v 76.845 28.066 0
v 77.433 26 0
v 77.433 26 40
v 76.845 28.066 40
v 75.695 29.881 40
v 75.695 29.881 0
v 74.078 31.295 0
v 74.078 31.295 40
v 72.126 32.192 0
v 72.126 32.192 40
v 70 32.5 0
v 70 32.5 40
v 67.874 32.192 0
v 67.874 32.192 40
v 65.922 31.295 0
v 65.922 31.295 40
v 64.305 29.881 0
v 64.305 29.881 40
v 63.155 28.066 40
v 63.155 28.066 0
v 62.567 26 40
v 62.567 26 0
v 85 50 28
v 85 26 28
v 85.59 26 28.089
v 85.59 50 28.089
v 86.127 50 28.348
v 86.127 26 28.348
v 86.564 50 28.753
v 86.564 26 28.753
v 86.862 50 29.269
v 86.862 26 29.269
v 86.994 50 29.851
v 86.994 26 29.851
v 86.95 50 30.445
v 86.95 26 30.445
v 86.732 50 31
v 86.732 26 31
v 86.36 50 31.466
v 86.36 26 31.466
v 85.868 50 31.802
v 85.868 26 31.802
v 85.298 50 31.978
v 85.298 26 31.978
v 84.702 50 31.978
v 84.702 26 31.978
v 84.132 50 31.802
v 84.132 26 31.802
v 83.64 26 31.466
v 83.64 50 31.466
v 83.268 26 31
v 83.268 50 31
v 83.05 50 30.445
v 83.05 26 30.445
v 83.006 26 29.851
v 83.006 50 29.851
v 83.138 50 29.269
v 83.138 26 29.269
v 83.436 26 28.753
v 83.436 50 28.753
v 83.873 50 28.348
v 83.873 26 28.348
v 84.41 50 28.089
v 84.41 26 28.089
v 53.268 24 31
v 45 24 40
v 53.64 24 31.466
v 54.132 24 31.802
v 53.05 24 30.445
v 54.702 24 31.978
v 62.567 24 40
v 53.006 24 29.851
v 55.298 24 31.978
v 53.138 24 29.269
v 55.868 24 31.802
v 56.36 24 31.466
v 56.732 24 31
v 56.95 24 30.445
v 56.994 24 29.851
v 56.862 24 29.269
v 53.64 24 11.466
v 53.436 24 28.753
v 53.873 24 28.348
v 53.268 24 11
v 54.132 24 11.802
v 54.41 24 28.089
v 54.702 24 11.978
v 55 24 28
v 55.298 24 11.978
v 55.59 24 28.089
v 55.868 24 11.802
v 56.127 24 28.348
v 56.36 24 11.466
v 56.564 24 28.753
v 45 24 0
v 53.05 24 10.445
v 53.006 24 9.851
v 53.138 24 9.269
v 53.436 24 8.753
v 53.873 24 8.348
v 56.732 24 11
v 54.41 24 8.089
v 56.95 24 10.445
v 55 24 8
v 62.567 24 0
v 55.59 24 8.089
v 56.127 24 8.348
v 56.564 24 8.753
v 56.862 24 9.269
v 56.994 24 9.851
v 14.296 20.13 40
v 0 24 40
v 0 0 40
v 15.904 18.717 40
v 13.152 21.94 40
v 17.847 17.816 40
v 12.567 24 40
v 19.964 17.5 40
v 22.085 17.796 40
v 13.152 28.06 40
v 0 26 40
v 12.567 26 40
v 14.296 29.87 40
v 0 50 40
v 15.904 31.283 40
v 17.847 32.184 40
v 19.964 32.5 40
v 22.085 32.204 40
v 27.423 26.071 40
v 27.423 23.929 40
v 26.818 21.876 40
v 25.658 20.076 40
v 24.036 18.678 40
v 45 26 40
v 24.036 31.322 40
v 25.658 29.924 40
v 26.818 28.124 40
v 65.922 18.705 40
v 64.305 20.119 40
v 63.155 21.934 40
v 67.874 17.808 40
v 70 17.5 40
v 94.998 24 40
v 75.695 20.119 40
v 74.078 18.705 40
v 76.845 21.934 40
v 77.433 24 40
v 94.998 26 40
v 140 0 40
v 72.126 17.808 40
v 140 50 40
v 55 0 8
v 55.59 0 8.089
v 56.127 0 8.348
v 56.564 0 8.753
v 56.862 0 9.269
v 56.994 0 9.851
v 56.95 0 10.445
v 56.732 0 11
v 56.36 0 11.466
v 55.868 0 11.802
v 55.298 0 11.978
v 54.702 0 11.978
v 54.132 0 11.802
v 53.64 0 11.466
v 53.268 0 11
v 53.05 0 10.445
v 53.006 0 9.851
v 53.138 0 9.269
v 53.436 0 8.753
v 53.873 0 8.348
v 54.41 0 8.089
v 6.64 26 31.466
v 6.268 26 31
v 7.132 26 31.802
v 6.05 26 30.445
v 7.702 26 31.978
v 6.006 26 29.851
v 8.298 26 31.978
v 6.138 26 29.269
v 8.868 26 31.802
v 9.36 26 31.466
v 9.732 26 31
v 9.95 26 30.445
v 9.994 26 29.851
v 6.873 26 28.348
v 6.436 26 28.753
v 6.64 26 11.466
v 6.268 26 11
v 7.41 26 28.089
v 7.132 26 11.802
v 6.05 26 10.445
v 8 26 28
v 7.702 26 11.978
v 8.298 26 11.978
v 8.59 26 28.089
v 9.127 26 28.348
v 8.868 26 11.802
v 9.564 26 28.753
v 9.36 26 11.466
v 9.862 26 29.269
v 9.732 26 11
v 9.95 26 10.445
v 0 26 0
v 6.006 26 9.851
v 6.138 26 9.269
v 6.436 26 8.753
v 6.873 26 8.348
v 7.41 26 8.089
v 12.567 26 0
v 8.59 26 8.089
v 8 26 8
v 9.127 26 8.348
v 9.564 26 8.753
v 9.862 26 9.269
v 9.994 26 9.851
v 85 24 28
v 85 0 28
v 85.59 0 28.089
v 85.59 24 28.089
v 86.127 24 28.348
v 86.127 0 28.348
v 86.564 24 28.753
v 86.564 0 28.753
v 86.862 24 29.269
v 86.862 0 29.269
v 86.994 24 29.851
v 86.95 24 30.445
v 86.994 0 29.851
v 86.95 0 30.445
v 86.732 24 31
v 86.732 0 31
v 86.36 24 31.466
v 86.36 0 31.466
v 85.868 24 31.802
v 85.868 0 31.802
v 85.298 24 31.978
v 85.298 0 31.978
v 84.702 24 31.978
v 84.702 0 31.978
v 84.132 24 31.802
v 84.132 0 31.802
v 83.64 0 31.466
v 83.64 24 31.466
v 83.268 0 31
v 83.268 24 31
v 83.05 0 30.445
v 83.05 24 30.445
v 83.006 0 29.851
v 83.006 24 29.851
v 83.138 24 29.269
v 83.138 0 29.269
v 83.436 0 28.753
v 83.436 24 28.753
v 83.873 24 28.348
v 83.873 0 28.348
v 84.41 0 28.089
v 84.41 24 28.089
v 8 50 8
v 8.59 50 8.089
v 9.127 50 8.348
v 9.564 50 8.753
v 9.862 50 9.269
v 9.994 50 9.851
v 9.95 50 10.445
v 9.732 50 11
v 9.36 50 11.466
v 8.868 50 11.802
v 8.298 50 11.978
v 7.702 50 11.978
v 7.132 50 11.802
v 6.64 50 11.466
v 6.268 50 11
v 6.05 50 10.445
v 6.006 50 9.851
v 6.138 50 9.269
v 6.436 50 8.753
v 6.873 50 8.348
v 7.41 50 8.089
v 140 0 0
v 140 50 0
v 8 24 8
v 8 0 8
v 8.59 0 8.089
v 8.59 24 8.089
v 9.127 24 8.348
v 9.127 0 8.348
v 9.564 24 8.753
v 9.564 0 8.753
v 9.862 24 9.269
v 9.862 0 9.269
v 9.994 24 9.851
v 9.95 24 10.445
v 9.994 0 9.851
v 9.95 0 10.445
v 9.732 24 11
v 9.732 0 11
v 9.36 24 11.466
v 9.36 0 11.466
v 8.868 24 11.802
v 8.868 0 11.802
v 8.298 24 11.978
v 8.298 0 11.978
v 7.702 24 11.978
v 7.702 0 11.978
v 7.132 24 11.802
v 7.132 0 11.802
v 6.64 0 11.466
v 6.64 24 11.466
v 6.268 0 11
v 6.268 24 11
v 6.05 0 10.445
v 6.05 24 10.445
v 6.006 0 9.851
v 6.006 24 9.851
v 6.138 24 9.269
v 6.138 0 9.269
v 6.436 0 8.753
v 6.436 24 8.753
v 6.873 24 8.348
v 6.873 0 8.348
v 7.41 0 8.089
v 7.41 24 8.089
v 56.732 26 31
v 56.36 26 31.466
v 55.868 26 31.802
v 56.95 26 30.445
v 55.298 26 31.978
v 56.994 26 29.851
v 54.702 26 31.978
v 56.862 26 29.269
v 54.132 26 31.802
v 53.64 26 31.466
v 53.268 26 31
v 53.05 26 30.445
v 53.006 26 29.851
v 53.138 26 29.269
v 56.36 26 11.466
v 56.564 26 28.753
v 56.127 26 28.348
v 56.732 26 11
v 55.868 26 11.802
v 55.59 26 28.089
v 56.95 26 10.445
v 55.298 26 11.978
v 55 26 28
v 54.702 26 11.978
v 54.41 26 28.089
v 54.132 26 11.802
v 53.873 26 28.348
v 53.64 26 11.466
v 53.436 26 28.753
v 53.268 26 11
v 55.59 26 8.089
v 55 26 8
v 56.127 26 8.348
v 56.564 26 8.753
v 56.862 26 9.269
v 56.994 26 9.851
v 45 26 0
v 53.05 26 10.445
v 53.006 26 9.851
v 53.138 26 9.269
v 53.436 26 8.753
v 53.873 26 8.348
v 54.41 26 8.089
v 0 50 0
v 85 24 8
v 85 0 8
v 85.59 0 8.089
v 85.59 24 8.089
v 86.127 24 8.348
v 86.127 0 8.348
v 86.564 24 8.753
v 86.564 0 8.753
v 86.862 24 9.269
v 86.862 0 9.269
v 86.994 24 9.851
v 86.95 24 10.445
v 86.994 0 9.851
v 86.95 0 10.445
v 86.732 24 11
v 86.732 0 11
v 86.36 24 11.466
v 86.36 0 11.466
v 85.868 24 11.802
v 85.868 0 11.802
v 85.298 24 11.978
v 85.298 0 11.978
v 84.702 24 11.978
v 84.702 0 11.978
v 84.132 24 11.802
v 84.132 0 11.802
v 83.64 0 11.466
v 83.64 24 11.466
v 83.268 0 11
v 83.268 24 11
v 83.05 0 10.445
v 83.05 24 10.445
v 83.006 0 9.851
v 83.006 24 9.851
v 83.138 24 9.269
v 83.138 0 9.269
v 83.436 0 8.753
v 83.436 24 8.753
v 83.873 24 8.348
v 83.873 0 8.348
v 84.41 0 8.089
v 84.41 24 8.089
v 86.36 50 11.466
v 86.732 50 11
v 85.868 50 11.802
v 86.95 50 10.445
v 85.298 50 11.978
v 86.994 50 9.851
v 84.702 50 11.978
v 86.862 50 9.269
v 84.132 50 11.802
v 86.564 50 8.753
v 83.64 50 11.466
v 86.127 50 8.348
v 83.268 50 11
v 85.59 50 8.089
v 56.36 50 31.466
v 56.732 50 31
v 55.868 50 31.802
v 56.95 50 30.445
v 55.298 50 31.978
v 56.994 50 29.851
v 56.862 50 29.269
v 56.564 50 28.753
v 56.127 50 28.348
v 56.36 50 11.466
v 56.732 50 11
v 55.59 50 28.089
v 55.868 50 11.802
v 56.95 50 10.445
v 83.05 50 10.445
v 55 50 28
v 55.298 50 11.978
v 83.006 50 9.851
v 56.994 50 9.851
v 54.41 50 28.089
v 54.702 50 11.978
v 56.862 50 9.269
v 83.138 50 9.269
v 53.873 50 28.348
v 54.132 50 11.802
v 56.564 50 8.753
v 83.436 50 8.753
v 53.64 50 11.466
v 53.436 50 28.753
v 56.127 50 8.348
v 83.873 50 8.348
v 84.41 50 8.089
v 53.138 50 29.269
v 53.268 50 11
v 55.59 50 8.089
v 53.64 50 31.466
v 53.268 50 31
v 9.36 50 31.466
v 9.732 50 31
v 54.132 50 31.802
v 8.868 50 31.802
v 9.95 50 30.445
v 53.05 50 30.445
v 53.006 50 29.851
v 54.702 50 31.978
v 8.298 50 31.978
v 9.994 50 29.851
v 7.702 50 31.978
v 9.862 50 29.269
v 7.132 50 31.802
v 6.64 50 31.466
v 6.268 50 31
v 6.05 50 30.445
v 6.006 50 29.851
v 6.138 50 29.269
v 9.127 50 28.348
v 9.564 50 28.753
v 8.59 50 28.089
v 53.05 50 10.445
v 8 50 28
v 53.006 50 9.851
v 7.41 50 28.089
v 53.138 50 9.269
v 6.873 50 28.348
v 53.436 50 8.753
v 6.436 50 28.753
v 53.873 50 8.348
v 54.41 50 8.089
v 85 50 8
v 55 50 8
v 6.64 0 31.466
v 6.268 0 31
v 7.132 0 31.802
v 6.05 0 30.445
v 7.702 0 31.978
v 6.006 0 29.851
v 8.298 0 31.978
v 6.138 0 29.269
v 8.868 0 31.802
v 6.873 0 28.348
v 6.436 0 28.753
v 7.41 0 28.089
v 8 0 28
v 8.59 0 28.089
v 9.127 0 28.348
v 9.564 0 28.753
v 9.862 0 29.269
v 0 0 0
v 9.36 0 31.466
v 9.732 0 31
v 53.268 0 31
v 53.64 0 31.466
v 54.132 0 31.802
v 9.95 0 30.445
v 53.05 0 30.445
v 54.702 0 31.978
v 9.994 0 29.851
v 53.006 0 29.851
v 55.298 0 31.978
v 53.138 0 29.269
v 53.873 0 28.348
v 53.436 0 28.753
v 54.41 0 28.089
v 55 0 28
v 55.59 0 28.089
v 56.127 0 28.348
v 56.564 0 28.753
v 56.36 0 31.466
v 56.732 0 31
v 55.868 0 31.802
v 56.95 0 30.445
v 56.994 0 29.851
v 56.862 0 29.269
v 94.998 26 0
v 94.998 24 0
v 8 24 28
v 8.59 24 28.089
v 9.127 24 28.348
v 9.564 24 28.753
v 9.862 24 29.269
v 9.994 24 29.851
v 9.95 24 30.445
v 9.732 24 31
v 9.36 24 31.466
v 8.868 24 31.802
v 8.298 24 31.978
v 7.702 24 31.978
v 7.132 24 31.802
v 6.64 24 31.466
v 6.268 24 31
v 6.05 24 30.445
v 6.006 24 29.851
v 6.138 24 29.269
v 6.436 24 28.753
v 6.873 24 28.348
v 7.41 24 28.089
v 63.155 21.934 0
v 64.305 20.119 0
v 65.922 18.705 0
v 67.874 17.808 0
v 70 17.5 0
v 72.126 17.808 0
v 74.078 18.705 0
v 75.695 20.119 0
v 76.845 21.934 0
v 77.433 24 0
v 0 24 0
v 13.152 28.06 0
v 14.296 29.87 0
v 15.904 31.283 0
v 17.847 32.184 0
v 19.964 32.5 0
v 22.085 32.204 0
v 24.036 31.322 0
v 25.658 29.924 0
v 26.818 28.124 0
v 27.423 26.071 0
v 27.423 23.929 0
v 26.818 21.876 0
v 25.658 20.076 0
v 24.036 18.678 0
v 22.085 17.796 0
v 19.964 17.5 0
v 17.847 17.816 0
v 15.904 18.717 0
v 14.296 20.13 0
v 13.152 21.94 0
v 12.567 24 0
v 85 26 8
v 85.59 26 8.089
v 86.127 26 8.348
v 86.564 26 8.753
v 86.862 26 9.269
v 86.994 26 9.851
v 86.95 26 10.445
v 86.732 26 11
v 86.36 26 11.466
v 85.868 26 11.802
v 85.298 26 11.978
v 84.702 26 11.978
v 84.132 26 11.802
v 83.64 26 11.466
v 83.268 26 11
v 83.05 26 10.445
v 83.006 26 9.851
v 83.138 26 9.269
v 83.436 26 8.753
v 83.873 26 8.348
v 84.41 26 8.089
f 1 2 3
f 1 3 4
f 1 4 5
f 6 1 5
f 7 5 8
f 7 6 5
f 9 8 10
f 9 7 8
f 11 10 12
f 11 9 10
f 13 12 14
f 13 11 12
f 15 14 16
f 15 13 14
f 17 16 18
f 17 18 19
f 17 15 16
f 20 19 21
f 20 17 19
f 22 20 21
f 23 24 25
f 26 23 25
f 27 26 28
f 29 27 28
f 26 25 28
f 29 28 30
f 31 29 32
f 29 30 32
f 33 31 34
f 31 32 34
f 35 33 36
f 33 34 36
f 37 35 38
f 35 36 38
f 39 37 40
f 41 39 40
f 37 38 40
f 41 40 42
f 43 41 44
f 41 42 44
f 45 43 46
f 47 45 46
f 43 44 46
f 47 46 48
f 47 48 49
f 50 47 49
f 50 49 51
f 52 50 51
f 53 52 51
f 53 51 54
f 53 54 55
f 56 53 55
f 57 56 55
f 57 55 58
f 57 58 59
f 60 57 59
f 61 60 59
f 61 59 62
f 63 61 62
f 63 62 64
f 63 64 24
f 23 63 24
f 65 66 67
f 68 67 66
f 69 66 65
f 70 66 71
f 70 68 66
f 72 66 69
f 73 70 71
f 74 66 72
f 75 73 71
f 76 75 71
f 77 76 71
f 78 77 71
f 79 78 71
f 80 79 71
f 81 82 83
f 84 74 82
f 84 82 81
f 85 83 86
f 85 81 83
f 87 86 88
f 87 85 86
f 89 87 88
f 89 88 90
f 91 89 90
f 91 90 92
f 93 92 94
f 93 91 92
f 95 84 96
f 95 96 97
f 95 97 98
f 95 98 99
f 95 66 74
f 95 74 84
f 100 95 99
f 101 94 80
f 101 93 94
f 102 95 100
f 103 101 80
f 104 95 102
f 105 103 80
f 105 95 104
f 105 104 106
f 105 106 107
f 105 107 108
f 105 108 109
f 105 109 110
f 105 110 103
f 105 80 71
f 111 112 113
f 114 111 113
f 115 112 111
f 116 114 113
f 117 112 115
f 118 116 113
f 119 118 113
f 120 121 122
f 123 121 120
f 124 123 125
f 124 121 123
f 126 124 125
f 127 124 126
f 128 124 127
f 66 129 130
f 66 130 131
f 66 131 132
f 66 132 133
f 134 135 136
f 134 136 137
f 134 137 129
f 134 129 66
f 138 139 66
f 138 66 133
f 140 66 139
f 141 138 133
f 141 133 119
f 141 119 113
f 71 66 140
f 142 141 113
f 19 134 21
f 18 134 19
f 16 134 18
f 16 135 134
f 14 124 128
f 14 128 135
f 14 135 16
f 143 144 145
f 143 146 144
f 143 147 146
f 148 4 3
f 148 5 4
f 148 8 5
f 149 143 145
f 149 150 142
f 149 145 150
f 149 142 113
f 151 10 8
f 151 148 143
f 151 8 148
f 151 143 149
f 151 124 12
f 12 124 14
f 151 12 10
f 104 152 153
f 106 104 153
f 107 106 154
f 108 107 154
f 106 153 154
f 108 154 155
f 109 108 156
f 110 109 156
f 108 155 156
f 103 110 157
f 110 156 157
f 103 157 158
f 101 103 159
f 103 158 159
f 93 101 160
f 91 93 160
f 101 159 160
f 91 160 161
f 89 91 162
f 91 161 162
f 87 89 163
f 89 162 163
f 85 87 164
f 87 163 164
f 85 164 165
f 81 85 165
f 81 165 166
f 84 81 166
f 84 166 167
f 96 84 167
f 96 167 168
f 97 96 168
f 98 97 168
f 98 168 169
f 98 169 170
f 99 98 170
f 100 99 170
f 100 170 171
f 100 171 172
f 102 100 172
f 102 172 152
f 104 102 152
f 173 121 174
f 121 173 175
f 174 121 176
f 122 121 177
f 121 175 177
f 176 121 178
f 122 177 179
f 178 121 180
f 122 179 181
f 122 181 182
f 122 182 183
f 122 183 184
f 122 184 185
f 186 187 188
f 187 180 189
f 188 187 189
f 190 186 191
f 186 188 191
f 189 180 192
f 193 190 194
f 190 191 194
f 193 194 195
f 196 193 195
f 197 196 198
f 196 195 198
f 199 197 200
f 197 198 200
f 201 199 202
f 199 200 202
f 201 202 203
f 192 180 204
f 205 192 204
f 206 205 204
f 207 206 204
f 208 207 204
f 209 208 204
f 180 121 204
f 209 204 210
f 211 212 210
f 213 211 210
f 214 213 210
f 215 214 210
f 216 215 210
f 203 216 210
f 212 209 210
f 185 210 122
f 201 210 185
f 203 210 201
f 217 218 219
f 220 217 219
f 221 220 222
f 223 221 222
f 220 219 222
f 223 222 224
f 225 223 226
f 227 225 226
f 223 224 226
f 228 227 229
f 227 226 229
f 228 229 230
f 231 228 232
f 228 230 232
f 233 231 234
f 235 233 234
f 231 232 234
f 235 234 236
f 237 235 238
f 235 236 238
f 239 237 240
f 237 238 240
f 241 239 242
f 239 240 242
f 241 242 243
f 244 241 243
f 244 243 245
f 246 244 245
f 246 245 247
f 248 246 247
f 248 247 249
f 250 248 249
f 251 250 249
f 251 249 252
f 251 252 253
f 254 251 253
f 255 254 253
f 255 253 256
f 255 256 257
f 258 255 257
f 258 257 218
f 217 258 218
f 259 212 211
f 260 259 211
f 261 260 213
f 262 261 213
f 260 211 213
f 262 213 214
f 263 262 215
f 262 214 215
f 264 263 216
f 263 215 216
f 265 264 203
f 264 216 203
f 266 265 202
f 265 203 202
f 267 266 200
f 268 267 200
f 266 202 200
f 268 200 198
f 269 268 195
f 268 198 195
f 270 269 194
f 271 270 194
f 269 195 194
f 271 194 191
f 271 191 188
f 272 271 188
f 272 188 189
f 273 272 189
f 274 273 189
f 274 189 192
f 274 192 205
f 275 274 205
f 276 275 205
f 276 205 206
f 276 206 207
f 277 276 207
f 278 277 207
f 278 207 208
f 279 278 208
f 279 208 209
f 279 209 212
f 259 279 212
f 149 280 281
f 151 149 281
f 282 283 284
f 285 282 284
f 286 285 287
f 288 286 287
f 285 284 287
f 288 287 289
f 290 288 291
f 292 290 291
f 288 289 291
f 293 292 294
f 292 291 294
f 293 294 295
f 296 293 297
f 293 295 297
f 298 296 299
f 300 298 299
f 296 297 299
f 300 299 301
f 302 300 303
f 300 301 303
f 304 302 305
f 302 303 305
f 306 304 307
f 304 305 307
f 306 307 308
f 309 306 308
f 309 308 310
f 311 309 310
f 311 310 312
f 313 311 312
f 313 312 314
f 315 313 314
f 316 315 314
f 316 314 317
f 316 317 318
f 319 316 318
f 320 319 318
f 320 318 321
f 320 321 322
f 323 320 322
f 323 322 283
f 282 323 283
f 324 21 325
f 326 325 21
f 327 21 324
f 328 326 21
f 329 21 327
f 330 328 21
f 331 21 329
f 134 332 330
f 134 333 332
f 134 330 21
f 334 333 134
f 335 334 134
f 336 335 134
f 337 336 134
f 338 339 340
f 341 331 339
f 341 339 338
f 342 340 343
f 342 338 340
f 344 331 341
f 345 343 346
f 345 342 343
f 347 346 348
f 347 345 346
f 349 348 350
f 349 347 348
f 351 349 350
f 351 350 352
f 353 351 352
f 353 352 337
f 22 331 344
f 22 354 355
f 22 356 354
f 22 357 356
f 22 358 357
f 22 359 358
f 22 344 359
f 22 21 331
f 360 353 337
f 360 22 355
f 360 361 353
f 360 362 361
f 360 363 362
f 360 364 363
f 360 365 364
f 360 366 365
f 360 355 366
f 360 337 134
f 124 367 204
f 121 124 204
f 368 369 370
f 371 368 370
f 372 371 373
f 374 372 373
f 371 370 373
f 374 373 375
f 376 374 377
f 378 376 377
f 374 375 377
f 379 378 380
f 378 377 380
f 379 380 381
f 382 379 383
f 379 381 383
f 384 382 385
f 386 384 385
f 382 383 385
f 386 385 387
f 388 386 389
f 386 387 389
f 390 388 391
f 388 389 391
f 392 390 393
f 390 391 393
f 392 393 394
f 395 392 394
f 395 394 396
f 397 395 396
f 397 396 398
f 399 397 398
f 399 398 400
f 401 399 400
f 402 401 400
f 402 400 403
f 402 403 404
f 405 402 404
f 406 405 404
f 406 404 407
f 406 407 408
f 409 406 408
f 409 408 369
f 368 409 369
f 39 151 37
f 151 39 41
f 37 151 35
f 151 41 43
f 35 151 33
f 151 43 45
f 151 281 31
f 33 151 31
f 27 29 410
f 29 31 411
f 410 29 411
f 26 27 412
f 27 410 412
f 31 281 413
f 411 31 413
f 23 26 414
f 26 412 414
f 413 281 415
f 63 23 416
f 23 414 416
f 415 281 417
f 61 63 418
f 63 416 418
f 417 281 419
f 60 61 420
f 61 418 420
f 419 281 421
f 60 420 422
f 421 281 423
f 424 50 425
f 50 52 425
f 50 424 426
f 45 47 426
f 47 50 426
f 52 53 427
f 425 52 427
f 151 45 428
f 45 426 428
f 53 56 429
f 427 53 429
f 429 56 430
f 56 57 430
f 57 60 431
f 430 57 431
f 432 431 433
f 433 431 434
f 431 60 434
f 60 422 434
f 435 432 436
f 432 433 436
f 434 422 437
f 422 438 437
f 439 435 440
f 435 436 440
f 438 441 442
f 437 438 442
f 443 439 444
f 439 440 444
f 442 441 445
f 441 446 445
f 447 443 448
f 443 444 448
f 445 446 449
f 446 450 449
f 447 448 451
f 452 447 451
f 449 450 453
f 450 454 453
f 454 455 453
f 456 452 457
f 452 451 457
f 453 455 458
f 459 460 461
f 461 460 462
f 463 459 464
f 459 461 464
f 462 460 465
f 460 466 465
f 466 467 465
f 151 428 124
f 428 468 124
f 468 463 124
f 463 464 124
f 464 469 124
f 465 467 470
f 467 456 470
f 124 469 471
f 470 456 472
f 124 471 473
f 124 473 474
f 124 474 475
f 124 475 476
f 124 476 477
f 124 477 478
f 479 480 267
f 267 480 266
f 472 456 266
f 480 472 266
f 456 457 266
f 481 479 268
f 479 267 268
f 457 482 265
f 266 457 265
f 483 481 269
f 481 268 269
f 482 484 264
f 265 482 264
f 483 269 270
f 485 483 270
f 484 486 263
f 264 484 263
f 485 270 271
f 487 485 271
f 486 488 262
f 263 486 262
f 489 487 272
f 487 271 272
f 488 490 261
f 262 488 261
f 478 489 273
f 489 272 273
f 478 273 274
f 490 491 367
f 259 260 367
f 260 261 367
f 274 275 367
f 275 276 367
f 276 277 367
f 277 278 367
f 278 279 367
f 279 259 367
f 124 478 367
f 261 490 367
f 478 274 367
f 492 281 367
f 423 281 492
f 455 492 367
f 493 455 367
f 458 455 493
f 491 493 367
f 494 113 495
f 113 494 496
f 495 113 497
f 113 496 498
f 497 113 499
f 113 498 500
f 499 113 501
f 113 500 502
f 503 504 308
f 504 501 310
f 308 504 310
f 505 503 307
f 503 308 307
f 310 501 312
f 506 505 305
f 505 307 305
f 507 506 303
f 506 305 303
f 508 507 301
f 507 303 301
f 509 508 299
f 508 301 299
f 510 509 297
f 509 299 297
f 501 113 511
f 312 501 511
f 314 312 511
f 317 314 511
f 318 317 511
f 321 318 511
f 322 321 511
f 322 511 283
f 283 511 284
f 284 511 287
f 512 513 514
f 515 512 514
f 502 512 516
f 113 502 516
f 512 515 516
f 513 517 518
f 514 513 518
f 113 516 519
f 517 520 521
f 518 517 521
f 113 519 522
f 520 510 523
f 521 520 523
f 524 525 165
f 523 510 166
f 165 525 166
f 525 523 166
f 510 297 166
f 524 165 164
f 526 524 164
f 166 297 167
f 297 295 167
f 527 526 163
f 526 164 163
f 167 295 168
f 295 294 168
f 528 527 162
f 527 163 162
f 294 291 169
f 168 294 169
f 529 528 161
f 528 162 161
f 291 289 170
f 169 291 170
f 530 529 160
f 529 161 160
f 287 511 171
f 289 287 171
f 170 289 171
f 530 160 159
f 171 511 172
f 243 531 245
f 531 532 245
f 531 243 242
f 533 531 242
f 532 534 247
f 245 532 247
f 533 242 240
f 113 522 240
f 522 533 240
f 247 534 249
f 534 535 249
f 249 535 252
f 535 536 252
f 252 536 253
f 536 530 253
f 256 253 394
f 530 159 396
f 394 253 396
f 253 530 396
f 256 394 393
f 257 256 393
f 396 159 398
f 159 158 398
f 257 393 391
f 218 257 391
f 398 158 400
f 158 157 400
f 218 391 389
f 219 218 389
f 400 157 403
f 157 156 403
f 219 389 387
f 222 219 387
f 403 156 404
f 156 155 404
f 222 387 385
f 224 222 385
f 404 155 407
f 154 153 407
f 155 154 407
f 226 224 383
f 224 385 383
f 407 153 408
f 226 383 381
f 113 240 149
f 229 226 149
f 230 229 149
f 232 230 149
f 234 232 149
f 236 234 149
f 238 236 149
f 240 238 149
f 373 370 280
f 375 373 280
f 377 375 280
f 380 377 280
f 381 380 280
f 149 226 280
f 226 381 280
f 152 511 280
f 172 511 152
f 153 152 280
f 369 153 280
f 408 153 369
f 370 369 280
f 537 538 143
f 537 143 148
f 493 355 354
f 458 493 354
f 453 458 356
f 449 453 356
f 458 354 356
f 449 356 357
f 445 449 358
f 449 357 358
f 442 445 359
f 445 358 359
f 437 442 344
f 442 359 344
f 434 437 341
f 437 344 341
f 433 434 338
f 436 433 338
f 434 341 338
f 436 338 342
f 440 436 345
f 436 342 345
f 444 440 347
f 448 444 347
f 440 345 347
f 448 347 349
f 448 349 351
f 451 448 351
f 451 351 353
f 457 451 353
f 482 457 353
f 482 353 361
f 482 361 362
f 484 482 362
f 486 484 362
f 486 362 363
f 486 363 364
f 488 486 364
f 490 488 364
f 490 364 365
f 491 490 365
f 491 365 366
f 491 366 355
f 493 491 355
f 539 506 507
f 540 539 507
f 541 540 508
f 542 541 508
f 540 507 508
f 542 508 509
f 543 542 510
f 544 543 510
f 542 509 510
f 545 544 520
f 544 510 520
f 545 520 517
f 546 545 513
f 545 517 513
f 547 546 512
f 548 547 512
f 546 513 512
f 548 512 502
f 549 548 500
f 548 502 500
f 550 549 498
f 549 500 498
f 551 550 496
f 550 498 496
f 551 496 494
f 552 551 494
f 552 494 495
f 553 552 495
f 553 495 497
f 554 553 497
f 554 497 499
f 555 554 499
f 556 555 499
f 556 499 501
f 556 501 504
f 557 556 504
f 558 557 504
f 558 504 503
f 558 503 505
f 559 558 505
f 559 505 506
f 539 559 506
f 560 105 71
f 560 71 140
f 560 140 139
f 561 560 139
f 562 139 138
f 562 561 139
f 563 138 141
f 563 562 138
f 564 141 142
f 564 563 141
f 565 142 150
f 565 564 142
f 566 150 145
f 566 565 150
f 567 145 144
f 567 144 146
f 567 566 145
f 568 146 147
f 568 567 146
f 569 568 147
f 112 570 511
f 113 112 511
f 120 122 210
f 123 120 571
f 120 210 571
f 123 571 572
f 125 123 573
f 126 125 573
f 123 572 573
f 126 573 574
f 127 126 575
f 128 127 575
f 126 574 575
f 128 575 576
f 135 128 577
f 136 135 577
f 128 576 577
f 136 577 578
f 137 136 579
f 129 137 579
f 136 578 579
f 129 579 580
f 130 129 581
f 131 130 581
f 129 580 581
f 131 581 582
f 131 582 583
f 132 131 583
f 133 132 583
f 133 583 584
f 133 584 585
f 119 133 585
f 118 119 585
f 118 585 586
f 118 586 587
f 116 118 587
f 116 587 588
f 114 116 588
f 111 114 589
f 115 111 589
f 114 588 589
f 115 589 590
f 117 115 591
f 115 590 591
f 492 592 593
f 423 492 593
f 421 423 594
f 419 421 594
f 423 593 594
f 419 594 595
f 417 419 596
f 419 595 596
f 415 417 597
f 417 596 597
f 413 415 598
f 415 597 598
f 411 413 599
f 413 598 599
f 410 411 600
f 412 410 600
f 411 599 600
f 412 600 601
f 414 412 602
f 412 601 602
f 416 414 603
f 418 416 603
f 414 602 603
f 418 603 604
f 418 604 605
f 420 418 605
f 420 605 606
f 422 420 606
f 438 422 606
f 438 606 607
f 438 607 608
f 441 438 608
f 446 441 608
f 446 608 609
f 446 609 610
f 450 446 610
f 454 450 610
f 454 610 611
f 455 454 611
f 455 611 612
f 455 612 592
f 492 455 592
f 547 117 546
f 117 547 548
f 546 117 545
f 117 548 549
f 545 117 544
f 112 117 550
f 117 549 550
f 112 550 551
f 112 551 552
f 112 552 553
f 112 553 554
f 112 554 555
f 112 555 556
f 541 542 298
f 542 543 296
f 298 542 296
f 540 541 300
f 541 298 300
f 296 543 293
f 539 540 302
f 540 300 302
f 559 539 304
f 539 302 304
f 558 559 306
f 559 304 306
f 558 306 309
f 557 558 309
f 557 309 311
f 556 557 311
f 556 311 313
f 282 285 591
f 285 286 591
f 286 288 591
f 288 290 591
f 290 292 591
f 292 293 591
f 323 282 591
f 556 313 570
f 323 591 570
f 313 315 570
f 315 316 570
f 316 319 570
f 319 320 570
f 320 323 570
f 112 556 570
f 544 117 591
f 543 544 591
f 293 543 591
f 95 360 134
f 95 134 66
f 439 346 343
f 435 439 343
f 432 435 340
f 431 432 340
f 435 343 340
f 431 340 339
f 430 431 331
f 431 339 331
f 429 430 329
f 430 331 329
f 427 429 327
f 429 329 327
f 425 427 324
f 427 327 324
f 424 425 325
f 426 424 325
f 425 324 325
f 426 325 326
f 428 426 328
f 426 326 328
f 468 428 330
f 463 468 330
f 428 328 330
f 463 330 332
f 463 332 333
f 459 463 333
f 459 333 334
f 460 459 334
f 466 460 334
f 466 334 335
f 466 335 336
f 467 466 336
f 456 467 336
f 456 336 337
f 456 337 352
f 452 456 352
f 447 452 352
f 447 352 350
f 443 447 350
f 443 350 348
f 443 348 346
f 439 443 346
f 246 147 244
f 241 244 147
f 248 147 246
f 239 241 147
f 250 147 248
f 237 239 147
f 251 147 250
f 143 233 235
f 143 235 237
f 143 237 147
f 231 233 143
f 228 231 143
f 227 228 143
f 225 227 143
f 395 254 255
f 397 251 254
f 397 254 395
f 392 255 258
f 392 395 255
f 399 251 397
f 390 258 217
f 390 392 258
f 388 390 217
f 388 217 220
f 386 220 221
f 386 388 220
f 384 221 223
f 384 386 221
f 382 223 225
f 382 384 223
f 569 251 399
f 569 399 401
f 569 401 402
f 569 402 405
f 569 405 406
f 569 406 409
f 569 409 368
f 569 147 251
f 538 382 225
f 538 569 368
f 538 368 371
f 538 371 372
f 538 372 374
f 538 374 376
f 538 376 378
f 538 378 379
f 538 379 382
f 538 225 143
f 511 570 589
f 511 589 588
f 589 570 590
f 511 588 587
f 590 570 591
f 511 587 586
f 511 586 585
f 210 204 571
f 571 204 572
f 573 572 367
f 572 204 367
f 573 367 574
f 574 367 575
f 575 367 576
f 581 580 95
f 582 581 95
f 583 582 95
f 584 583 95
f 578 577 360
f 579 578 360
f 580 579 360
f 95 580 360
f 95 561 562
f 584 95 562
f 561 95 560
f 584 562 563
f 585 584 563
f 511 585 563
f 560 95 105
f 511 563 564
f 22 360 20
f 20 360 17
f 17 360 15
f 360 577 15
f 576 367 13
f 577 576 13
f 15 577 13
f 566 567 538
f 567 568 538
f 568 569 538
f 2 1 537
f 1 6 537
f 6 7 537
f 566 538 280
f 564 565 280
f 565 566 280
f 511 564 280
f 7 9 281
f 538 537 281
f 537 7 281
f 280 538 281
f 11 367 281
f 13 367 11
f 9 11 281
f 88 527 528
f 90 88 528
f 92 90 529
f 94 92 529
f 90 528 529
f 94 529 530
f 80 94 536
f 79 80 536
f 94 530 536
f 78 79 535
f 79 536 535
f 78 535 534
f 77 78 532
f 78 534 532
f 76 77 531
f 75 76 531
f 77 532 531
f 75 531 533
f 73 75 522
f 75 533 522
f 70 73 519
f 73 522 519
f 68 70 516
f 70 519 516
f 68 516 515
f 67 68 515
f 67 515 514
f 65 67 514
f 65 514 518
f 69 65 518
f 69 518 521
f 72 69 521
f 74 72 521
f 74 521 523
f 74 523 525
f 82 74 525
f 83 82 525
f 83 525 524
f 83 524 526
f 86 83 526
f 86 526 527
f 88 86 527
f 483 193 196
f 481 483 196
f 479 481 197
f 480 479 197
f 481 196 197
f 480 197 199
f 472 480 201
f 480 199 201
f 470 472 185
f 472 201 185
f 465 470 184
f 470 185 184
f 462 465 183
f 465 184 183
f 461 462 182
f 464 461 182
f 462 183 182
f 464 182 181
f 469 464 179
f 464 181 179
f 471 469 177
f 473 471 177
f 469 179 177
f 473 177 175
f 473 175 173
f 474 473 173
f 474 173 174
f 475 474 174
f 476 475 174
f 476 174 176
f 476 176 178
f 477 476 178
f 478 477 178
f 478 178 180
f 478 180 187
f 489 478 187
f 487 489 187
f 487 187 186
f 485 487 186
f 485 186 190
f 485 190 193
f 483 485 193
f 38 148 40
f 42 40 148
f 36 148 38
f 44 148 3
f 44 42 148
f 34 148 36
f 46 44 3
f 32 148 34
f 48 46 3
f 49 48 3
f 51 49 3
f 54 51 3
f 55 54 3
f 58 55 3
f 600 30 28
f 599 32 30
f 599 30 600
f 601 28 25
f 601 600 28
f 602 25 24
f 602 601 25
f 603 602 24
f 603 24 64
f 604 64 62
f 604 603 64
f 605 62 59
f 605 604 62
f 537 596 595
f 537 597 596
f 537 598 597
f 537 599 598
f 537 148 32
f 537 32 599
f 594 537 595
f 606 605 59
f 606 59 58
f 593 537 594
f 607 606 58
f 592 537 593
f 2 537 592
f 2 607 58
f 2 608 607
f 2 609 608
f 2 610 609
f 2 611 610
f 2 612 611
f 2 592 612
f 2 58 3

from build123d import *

# Parameters (mm, degrees)
EXTRUDE_1_DEPTH     = 40
SKETCH_8_R          = 2
CUT_EXTRUDE_5_DEPTH = 50


with BuildPart() as part:
    # Эскиз1 → Бобышка-Вытянуть1 (new body)
    with BuildSketch(Plane.XY):
        with BuildLine():
            Line((0, 0), (140, 0))
            Line((140, 0), (140, 34))
            Line((140, 34), (140, 50))
            Line((140, 50), (0, 50))
            Line((0, 50), (0, 26))
            Line((0, 26), (12.566965626, 26))
            ThreePointArc((12.566965626, 26), (27.5, 25), (12.566965626, 24))
            Line((12.566965626, 24), (0, 24))
            Line((0, 24), (0, 0))
        make_face()
        with BuildLine():
            Line((62.566965626, 26), (45, 26))
            Line((45, 26), (45, 24))
            Line((45, 24), (62.566965626, 24))
            ThreePointArc((62.566965626, 24), (70, 17.5), (77.433034374, 24))
            Line((77.433034374, 24), (94.997657208, 24))
            Line((94.997657208, 24), (94.997657208, 26))
            Line((94.997657208, 26), (77.433034374, 26))
            ThreePointArc((77.433034374, 26), (70, 32.5), (62.566965626, 26))
        make_face(mode=Mode.SUBTRACT)
    extrude(amount=EXTRUDE_1_DEPTH)

    # Эскиз8 → Вырез-Вытянуть5 (cut)
    with BuildSketch(Plane.XZ):
        with Locations(Location((8, 30, 0), (0, 0, 270))):
            Circle(SKETCH_8_R)
        with Locations(Location((8, 10, 0), (0, 0, 270))):
            Circle(SKETCH_8_R)
        with Locations(Location((55, 30, 0), (0, 0, 270))):
            Circle(SKETCH_8_R)
        with Locations(Location((55, 10, 0), (0, 0, 270))):
            Circle(SKETCH_8_R)
        with Locations(Location((85, 30, 0), (0, 0, 270))):
            Circle(SKETCH_8_R)
        with Locations(Location((85, 10, 0), (0, 0, 270))):
            Circle(SKETCH_8_R)
    extrude(amount=-CUT_EXTRUDE_5_DEPTH, mode=Mode.SUBTRACT)


solid = part.part
